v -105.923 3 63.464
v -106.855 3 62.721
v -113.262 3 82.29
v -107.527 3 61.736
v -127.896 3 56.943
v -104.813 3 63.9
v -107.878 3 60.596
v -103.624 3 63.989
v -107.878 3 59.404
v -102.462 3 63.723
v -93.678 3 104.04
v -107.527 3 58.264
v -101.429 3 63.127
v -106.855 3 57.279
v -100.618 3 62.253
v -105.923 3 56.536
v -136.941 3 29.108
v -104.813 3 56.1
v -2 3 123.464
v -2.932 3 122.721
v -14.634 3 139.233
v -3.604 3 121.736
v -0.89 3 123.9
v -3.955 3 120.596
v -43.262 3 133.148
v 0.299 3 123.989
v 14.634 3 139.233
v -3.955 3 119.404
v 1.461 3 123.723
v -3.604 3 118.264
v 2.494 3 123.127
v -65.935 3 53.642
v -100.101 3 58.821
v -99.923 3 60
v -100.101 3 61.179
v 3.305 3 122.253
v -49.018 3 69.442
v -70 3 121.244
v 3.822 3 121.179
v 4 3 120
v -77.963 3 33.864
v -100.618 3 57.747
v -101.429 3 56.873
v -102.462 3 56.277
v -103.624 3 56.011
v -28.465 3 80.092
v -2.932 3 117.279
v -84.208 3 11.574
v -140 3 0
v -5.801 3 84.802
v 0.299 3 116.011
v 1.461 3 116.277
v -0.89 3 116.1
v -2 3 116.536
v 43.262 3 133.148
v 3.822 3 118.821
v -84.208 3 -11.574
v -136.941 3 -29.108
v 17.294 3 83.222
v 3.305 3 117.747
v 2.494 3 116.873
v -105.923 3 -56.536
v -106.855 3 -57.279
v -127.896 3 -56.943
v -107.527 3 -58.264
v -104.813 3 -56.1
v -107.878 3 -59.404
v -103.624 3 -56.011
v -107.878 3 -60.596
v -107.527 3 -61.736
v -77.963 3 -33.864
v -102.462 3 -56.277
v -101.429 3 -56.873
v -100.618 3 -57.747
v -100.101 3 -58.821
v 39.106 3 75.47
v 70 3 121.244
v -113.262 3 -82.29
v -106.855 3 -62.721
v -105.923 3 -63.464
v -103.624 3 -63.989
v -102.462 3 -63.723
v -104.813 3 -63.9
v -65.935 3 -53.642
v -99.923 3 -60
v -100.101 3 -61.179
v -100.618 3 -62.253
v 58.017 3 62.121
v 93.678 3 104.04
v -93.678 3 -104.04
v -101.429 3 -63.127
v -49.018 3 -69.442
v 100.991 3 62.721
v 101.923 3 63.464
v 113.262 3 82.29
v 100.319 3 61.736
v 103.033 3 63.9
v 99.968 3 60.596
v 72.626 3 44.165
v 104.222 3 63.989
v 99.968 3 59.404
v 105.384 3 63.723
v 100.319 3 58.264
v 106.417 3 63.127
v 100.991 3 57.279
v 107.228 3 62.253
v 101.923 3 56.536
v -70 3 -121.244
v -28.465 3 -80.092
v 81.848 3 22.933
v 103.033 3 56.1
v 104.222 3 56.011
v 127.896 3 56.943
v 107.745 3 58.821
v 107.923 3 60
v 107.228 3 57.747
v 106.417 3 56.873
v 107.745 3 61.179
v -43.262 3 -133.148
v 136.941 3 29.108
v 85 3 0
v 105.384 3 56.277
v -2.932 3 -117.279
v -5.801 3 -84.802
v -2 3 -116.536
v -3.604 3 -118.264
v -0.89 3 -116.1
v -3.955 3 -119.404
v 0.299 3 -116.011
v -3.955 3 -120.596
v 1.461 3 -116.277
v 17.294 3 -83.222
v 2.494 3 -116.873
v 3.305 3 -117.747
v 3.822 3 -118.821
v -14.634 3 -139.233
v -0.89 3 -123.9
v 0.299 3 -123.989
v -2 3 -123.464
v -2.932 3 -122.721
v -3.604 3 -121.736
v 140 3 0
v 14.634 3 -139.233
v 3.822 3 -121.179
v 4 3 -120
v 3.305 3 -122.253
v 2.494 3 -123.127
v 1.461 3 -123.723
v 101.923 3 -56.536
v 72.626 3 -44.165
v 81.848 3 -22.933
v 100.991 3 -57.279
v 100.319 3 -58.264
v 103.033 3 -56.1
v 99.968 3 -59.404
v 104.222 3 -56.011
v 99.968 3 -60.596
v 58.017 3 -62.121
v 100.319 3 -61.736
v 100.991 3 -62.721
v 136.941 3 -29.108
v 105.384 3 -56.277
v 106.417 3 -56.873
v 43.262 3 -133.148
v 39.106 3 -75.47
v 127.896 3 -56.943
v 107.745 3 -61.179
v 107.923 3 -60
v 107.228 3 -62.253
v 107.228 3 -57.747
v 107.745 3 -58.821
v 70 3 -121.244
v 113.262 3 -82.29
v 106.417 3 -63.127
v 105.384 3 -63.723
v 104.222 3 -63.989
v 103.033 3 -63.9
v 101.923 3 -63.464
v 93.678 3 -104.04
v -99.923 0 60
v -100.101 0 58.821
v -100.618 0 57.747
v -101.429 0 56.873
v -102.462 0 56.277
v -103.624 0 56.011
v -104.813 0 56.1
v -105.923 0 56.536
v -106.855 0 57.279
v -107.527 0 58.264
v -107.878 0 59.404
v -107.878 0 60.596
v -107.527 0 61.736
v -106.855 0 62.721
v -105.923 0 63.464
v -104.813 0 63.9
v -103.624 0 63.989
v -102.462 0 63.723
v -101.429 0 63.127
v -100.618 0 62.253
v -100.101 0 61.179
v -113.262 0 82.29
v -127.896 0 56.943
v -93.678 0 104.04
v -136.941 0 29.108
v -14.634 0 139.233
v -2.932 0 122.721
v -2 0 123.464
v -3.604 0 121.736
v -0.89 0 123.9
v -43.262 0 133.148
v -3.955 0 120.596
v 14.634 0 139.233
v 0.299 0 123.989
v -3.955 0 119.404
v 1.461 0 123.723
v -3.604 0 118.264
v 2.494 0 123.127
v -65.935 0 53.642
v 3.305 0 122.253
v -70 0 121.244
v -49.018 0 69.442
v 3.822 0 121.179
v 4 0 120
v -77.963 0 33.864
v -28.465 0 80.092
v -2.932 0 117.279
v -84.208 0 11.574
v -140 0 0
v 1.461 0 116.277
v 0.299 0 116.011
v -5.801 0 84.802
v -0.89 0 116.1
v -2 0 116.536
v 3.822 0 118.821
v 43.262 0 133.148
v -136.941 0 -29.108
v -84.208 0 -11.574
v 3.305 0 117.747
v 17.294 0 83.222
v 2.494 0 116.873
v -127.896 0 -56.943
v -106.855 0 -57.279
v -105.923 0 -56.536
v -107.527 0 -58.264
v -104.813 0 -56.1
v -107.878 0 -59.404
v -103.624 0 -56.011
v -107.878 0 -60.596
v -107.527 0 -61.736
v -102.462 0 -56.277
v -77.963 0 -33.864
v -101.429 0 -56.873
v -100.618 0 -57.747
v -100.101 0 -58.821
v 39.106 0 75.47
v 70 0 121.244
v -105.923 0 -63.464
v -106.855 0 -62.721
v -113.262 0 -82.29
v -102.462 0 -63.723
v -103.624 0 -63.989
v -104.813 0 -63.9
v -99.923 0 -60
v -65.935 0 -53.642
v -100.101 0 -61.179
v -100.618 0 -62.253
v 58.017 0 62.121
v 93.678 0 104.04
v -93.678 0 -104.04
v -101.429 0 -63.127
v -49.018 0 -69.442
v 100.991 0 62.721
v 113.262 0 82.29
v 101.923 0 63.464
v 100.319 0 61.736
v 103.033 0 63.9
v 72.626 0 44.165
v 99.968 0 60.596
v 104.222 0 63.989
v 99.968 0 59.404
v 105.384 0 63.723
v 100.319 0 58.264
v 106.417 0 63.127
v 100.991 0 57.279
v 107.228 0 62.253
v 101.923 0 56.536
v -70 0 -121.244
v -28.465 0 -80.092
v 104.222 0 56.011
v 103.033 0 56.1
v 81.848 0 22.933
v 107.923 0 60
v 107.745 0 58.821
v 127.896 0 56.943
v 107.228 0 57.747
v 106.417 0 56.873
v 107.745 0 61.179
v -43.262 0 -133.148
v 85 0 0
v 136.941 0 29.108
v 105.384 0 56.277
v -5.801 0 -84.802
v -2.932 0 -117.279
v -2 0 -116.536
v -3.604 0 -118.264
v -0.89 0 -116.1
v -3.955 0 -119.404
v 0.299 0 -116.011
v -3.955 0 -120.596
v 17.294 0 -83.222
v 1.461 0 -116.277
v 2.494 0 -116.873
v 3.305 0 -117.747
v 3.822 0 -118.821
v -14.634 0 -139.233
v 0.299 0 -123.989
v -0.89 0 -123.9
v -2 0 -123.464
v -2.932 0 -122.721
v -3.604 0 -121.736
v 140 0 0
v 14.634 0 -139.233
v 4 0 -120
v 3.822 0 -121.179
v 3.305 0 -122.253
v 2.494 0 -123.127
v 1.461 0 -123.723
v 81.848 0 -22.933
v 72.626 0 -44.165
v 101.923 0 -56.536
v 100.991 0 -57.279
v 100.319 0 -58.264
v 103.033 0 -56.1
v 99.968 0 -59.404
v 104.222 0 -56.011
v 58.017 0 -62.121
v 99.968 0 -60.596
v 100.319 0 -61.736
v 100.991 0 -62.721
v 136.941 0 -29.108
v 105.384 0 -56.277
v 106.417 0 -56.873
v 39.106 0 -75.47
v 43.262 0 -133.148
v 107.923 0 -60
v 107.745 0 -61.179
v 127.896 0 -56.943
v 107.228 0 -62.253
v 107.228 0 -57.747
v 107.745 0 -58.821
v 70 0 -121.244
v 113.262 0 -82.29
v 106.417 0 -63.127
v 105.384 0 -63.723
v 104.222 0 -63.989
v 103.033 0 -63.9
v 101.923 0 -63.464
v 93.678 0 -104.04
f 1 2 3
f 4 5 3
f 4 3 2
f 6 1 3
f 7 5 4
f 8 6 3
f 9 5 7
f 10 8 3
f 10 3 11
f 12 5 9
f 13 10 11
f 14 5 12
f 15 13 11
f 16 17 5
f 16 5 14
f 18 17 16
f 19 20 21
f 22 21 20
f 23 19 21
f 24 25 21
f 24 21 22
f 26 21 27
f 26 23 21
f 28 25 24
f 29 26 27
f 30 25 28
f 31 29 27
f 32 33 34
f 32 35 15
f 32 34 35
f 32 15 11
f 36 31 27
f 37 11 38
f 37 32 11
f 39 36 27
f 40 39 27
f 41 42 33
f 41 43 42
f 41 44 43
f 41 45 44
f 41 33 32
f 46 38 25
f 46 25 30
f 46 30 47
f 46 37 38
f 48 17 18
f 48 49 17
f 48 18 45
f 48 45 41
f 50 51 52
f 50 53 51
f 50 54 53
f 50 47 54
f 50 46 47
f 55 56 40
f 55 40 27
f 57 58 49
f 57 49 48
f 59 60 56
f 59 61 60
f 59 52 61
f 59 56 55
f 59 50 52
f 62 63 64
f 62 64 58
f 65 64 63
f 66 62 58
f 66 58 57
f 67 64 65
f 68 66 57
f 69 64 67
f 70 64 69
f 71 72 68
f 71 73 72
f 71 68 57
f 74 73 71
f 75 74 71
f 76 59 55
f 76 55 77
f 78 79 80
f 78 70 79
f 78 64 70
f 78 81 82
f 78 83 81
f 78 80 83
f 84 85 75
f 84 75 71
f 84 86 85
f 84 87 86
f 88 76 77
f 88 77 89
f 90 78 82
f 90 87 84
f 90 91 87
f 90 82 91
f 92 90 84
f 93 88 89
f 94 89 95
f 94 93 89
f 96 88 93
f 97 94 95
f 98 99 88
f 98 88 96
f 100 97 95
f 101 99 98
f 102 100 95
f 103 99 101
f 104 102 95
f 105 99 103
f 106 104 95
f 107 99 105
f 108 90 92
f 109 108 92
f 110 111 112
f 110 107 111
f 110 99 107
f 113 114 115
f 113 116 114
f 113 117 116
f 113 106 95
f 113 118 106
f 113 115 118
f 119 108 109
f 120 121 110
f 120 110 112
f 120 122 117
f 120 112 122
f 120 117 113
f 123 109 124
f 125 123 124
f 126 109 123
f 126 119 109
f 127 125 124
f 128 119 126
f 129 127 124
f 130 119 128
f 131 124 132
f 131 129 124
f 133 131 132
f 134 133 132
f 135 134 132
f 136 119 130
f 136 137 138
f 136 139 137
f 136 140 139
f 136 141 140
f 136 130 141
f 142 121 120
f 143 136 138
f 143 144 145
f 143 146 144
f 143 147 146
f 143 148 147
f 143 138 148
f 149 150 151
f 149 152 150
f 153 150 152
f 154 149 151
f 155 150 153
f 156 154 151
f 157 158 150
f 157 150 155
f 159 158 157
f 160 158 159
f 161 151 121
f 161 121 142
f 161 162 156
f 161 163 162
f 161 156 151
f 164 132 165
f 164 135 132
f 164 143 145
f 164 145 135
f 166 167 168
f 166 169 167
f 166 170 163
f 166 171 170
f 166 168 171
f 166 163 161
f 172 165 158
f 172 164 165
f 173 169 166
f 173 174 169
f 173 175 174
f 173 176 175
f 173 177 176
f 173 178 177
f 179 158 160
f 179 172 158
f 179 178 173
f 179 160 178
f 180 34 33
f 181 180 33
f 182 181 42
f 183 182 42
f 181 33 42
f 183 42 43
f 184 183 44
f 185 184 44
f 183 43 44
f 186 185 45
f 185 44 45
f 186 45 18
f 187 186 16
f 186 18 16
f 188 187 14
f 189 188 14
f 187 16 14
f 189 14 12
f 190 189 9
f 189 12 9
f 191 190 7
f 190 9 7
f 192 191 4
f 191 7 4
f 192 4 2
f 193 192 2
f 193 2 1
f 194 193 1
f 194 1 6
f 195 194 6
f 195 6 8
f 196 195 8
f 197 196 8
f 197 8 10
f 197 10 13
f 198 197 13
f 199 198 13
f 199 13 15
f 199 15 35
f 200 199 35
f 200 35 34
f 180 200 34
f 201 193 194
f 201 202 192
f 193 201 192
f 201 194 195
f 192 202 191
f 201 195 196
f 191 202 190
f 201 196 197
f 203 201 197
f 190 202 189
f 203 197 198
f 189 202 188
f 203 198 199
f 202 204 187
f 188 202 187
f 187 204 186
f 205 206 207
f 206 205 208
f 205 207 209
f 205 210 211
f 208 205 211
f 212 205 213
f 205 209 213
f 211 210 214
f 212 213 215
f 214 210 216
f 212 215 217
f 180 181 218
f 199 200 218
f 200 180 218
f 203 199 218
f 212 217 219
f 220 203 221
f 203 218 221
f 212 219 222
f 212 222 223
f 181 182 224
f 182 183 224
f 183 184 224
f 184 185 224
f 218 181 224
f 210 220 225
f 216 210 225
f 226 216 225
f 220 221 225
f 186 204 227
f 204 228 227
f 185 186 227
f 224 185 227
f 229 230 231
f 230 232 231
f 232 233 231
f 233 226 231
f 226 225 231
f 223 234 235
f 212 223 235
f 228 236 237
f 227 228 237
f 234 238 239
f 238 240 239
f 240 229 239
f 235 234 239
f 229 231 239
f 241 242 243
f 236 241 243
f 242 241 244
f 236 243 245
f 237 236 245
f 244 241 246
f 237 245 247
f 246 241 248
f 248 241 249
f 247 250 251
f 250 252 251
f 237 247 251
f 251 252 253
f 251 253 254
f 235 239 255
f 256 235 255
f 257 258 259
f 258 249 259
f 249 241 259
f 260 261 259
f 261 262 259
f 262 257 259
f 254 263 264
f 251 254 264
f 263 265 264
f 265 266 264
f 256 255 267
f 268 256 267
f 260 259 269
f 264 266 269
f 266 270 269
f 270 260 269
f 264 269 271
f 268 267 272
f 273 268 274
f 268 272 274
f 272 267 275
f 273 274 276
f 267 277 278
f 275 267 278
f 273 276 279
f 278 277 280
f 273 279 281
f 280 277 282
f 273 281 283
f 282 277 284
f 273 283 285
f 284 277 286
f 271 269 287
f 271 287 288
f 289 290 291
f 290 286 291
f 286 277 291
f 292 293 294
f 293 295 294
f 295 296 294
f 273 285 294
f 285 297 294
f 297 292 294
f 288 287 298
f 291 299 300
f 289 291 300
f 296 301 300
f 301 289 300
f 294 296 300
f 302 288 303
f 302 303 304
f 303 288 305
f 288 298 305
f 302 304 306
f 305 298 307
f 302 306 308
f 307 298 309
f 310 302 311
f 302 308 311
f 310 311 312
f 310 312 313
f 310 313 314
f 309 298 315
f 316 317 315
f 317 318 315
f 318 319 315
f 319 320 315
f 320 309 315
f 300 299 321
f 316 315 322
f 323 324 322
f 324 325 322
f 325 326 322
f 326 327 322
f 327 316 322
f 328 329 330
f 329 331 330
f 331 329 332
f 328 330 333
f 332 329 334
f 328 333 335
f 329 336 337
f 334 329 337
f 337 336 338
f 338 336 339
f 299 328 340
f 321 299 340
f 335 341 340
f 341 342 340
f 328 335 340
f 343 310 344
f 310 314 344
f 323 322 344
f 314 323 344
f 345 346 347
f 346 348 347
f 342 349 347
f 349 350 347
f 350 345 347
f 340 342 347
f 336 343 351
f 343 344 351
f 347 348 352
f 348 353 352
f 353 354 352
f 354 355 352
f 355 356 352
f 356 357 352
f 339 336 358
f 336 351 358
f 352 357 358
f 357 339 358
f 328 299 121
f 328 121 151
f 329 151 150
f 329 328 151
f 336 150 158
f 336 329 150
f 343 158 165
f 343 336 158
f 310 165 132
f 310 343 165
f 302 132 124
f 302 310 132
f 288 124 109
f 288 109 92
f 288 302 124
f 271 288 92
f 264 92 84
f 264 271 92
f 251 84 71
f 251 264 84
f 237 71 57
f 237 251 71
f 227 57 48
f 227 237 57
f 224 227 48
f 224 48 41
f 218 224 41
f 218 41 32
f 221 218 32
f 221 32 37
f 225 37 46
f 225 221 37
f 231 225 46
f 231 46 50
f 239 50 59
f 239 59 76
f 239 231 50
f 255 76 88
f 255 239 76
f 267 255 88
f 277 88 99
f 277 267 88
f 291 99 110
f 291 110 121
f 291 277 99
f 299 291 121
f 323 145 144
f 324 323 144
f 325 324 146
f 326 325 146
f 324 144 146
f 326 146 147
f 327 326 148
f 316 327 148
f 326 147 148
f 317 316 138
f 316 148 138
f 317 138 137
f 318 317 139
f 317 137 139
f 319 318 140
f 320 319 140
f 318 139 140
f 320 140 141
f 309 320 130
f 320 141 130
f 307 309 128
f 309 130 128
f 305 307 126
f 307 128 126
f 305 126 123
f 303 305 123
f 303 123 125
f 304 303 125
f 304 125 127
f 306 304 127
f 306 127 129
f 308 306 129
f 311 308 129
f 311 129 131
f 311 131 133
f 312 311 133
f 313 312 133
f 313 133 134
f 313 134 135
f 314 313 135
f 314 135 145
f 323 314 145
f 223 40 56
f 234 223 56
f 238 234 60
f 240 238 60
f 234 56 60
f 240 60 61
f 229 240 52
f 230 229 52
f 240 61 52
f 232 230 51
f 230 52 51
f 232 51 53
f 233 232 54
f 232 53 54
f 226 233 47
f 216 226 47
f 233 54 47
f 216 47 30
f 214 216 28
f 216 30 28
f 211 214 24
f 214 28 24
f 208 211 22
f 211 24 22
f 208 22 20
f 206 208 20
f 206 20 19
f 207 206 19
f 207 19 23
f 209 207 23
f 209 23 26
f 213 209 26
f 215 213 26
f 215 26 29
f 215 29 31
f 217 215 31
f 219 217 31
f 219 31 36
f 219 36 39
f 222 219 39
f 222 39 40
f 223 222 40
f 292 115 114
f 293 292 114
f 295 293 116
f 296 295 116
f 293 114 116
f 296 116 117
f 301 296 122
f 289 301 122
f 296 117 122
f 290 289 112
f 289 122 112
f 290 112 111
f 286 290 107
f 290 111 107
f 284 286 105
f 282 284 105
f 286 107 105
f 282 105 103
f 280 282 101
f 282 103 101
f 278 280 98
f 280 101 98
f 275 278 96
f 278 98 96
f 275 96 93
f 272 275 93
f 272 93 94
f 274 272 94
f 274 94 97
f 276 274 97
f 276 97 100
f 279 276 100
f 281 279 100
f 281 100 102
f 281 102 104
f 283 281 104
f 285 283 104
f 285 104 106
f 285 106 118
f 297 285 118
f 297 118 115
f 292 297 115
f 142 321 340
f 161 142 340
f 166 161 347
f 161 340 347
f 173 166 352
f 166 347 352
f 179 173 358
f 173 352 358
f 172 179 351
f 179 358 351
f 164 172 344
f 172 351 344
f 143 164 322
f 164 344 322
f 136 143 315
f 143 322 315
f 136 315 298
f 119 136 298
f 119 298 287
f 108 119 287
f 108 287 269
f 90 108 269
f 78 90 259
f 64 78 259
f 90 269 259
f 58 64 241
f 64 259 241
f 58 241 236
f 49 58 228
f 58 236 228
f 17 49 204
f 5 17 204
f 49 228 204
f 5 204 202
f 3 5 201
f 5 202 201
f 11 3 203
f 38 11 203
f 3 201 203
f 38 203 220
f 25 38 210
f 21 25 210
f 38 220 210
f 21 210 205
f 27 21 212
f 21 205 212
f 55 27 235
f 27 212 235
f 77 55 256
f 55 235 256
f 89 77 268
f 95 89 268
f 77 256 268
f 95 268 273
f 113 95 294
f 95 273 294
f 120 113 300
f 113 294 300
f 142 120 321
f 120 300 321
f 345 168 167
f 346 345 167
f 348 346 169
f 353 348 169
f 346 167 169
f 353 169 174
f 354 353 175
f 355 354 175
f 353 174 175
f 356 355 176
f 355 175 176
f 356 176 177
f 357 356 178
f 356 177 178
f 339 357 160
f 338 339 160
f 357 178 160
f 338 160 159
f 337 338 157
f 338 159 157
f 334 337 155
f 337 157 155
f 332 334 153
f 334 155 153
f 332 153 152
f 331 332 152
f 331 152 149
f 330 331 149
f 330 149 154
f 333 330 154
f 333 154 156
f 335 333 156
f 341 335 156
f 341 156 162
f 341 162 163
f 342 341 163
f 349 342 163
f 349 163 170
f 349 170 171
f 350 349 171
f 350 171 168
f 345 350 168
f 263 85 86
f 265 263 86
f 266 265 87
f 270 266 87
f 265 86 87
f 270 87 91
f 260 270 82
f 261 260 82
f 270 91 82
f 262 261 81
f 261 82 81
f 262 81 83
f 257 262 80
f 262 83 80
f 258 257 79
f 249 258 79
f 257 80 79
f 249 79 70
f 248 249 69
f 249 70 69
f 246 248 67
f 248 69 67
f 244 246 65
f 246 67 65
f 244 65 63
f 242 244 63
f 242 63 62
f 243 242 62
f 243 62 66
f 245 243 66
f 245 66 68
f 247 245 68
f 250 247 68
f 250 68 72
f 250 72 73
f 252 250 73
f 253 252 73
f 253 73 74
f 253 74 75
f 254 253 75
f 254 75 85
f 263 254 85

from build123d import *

# Parameters (mm, degrees)
CROQUIS1_R              = 140
CROQUIS1_R_2            = 85
SALIENTE_EXTRUIR1_DEPTH = 3
CROQUIS2_R              = 4
CORTAR_EXTRUIR1_DEPTH   = 4


with BuildPart() as part:
    # Croquis1 → Saliente-Extruir1 (new body)
    with BuildSketch(Plane(origin=(0, 0, 0), x_dir=(1, 0, 0), z_dir=(0, 1, 0))):
        Circle(CROQUIS1_R)
        Circle(CROQUIS1_R_2, mode=Mode.SUBTRACT)
    extrude(amount=SALIENTE_EXTRUIR1_DEPTH)

    # Croquis2 → Cortar-Extruir1 (cut, through all)
    with BuildSketch(Plane(origin=(0, 3, 0), x_dir=(1, 0, 0), z_dir=(0, 1, 0))):
        with Locations((0, 120)):
            Circle(CROQUIS2_R)
        with Locations((103.923048454, 60)):
            Circle(CROQUIS2_R)
        with Locations((103.923048454, -60)):
            Circle(CROQUIS2_R)
        with Locations((0, -120)):
            Circle(CROQUIS2_R)
        with Locations((-103.923048454, -60)):
            Circle(CROQUIS2_R)
        with Locations((-103.923048454, 60)):
            Circle(CROQUIS2_R)
    extrude(amount=-CORTAR_EXTRUIR1_DEPTH, mode=Mode.SUBTRACT)


solid = part.part
